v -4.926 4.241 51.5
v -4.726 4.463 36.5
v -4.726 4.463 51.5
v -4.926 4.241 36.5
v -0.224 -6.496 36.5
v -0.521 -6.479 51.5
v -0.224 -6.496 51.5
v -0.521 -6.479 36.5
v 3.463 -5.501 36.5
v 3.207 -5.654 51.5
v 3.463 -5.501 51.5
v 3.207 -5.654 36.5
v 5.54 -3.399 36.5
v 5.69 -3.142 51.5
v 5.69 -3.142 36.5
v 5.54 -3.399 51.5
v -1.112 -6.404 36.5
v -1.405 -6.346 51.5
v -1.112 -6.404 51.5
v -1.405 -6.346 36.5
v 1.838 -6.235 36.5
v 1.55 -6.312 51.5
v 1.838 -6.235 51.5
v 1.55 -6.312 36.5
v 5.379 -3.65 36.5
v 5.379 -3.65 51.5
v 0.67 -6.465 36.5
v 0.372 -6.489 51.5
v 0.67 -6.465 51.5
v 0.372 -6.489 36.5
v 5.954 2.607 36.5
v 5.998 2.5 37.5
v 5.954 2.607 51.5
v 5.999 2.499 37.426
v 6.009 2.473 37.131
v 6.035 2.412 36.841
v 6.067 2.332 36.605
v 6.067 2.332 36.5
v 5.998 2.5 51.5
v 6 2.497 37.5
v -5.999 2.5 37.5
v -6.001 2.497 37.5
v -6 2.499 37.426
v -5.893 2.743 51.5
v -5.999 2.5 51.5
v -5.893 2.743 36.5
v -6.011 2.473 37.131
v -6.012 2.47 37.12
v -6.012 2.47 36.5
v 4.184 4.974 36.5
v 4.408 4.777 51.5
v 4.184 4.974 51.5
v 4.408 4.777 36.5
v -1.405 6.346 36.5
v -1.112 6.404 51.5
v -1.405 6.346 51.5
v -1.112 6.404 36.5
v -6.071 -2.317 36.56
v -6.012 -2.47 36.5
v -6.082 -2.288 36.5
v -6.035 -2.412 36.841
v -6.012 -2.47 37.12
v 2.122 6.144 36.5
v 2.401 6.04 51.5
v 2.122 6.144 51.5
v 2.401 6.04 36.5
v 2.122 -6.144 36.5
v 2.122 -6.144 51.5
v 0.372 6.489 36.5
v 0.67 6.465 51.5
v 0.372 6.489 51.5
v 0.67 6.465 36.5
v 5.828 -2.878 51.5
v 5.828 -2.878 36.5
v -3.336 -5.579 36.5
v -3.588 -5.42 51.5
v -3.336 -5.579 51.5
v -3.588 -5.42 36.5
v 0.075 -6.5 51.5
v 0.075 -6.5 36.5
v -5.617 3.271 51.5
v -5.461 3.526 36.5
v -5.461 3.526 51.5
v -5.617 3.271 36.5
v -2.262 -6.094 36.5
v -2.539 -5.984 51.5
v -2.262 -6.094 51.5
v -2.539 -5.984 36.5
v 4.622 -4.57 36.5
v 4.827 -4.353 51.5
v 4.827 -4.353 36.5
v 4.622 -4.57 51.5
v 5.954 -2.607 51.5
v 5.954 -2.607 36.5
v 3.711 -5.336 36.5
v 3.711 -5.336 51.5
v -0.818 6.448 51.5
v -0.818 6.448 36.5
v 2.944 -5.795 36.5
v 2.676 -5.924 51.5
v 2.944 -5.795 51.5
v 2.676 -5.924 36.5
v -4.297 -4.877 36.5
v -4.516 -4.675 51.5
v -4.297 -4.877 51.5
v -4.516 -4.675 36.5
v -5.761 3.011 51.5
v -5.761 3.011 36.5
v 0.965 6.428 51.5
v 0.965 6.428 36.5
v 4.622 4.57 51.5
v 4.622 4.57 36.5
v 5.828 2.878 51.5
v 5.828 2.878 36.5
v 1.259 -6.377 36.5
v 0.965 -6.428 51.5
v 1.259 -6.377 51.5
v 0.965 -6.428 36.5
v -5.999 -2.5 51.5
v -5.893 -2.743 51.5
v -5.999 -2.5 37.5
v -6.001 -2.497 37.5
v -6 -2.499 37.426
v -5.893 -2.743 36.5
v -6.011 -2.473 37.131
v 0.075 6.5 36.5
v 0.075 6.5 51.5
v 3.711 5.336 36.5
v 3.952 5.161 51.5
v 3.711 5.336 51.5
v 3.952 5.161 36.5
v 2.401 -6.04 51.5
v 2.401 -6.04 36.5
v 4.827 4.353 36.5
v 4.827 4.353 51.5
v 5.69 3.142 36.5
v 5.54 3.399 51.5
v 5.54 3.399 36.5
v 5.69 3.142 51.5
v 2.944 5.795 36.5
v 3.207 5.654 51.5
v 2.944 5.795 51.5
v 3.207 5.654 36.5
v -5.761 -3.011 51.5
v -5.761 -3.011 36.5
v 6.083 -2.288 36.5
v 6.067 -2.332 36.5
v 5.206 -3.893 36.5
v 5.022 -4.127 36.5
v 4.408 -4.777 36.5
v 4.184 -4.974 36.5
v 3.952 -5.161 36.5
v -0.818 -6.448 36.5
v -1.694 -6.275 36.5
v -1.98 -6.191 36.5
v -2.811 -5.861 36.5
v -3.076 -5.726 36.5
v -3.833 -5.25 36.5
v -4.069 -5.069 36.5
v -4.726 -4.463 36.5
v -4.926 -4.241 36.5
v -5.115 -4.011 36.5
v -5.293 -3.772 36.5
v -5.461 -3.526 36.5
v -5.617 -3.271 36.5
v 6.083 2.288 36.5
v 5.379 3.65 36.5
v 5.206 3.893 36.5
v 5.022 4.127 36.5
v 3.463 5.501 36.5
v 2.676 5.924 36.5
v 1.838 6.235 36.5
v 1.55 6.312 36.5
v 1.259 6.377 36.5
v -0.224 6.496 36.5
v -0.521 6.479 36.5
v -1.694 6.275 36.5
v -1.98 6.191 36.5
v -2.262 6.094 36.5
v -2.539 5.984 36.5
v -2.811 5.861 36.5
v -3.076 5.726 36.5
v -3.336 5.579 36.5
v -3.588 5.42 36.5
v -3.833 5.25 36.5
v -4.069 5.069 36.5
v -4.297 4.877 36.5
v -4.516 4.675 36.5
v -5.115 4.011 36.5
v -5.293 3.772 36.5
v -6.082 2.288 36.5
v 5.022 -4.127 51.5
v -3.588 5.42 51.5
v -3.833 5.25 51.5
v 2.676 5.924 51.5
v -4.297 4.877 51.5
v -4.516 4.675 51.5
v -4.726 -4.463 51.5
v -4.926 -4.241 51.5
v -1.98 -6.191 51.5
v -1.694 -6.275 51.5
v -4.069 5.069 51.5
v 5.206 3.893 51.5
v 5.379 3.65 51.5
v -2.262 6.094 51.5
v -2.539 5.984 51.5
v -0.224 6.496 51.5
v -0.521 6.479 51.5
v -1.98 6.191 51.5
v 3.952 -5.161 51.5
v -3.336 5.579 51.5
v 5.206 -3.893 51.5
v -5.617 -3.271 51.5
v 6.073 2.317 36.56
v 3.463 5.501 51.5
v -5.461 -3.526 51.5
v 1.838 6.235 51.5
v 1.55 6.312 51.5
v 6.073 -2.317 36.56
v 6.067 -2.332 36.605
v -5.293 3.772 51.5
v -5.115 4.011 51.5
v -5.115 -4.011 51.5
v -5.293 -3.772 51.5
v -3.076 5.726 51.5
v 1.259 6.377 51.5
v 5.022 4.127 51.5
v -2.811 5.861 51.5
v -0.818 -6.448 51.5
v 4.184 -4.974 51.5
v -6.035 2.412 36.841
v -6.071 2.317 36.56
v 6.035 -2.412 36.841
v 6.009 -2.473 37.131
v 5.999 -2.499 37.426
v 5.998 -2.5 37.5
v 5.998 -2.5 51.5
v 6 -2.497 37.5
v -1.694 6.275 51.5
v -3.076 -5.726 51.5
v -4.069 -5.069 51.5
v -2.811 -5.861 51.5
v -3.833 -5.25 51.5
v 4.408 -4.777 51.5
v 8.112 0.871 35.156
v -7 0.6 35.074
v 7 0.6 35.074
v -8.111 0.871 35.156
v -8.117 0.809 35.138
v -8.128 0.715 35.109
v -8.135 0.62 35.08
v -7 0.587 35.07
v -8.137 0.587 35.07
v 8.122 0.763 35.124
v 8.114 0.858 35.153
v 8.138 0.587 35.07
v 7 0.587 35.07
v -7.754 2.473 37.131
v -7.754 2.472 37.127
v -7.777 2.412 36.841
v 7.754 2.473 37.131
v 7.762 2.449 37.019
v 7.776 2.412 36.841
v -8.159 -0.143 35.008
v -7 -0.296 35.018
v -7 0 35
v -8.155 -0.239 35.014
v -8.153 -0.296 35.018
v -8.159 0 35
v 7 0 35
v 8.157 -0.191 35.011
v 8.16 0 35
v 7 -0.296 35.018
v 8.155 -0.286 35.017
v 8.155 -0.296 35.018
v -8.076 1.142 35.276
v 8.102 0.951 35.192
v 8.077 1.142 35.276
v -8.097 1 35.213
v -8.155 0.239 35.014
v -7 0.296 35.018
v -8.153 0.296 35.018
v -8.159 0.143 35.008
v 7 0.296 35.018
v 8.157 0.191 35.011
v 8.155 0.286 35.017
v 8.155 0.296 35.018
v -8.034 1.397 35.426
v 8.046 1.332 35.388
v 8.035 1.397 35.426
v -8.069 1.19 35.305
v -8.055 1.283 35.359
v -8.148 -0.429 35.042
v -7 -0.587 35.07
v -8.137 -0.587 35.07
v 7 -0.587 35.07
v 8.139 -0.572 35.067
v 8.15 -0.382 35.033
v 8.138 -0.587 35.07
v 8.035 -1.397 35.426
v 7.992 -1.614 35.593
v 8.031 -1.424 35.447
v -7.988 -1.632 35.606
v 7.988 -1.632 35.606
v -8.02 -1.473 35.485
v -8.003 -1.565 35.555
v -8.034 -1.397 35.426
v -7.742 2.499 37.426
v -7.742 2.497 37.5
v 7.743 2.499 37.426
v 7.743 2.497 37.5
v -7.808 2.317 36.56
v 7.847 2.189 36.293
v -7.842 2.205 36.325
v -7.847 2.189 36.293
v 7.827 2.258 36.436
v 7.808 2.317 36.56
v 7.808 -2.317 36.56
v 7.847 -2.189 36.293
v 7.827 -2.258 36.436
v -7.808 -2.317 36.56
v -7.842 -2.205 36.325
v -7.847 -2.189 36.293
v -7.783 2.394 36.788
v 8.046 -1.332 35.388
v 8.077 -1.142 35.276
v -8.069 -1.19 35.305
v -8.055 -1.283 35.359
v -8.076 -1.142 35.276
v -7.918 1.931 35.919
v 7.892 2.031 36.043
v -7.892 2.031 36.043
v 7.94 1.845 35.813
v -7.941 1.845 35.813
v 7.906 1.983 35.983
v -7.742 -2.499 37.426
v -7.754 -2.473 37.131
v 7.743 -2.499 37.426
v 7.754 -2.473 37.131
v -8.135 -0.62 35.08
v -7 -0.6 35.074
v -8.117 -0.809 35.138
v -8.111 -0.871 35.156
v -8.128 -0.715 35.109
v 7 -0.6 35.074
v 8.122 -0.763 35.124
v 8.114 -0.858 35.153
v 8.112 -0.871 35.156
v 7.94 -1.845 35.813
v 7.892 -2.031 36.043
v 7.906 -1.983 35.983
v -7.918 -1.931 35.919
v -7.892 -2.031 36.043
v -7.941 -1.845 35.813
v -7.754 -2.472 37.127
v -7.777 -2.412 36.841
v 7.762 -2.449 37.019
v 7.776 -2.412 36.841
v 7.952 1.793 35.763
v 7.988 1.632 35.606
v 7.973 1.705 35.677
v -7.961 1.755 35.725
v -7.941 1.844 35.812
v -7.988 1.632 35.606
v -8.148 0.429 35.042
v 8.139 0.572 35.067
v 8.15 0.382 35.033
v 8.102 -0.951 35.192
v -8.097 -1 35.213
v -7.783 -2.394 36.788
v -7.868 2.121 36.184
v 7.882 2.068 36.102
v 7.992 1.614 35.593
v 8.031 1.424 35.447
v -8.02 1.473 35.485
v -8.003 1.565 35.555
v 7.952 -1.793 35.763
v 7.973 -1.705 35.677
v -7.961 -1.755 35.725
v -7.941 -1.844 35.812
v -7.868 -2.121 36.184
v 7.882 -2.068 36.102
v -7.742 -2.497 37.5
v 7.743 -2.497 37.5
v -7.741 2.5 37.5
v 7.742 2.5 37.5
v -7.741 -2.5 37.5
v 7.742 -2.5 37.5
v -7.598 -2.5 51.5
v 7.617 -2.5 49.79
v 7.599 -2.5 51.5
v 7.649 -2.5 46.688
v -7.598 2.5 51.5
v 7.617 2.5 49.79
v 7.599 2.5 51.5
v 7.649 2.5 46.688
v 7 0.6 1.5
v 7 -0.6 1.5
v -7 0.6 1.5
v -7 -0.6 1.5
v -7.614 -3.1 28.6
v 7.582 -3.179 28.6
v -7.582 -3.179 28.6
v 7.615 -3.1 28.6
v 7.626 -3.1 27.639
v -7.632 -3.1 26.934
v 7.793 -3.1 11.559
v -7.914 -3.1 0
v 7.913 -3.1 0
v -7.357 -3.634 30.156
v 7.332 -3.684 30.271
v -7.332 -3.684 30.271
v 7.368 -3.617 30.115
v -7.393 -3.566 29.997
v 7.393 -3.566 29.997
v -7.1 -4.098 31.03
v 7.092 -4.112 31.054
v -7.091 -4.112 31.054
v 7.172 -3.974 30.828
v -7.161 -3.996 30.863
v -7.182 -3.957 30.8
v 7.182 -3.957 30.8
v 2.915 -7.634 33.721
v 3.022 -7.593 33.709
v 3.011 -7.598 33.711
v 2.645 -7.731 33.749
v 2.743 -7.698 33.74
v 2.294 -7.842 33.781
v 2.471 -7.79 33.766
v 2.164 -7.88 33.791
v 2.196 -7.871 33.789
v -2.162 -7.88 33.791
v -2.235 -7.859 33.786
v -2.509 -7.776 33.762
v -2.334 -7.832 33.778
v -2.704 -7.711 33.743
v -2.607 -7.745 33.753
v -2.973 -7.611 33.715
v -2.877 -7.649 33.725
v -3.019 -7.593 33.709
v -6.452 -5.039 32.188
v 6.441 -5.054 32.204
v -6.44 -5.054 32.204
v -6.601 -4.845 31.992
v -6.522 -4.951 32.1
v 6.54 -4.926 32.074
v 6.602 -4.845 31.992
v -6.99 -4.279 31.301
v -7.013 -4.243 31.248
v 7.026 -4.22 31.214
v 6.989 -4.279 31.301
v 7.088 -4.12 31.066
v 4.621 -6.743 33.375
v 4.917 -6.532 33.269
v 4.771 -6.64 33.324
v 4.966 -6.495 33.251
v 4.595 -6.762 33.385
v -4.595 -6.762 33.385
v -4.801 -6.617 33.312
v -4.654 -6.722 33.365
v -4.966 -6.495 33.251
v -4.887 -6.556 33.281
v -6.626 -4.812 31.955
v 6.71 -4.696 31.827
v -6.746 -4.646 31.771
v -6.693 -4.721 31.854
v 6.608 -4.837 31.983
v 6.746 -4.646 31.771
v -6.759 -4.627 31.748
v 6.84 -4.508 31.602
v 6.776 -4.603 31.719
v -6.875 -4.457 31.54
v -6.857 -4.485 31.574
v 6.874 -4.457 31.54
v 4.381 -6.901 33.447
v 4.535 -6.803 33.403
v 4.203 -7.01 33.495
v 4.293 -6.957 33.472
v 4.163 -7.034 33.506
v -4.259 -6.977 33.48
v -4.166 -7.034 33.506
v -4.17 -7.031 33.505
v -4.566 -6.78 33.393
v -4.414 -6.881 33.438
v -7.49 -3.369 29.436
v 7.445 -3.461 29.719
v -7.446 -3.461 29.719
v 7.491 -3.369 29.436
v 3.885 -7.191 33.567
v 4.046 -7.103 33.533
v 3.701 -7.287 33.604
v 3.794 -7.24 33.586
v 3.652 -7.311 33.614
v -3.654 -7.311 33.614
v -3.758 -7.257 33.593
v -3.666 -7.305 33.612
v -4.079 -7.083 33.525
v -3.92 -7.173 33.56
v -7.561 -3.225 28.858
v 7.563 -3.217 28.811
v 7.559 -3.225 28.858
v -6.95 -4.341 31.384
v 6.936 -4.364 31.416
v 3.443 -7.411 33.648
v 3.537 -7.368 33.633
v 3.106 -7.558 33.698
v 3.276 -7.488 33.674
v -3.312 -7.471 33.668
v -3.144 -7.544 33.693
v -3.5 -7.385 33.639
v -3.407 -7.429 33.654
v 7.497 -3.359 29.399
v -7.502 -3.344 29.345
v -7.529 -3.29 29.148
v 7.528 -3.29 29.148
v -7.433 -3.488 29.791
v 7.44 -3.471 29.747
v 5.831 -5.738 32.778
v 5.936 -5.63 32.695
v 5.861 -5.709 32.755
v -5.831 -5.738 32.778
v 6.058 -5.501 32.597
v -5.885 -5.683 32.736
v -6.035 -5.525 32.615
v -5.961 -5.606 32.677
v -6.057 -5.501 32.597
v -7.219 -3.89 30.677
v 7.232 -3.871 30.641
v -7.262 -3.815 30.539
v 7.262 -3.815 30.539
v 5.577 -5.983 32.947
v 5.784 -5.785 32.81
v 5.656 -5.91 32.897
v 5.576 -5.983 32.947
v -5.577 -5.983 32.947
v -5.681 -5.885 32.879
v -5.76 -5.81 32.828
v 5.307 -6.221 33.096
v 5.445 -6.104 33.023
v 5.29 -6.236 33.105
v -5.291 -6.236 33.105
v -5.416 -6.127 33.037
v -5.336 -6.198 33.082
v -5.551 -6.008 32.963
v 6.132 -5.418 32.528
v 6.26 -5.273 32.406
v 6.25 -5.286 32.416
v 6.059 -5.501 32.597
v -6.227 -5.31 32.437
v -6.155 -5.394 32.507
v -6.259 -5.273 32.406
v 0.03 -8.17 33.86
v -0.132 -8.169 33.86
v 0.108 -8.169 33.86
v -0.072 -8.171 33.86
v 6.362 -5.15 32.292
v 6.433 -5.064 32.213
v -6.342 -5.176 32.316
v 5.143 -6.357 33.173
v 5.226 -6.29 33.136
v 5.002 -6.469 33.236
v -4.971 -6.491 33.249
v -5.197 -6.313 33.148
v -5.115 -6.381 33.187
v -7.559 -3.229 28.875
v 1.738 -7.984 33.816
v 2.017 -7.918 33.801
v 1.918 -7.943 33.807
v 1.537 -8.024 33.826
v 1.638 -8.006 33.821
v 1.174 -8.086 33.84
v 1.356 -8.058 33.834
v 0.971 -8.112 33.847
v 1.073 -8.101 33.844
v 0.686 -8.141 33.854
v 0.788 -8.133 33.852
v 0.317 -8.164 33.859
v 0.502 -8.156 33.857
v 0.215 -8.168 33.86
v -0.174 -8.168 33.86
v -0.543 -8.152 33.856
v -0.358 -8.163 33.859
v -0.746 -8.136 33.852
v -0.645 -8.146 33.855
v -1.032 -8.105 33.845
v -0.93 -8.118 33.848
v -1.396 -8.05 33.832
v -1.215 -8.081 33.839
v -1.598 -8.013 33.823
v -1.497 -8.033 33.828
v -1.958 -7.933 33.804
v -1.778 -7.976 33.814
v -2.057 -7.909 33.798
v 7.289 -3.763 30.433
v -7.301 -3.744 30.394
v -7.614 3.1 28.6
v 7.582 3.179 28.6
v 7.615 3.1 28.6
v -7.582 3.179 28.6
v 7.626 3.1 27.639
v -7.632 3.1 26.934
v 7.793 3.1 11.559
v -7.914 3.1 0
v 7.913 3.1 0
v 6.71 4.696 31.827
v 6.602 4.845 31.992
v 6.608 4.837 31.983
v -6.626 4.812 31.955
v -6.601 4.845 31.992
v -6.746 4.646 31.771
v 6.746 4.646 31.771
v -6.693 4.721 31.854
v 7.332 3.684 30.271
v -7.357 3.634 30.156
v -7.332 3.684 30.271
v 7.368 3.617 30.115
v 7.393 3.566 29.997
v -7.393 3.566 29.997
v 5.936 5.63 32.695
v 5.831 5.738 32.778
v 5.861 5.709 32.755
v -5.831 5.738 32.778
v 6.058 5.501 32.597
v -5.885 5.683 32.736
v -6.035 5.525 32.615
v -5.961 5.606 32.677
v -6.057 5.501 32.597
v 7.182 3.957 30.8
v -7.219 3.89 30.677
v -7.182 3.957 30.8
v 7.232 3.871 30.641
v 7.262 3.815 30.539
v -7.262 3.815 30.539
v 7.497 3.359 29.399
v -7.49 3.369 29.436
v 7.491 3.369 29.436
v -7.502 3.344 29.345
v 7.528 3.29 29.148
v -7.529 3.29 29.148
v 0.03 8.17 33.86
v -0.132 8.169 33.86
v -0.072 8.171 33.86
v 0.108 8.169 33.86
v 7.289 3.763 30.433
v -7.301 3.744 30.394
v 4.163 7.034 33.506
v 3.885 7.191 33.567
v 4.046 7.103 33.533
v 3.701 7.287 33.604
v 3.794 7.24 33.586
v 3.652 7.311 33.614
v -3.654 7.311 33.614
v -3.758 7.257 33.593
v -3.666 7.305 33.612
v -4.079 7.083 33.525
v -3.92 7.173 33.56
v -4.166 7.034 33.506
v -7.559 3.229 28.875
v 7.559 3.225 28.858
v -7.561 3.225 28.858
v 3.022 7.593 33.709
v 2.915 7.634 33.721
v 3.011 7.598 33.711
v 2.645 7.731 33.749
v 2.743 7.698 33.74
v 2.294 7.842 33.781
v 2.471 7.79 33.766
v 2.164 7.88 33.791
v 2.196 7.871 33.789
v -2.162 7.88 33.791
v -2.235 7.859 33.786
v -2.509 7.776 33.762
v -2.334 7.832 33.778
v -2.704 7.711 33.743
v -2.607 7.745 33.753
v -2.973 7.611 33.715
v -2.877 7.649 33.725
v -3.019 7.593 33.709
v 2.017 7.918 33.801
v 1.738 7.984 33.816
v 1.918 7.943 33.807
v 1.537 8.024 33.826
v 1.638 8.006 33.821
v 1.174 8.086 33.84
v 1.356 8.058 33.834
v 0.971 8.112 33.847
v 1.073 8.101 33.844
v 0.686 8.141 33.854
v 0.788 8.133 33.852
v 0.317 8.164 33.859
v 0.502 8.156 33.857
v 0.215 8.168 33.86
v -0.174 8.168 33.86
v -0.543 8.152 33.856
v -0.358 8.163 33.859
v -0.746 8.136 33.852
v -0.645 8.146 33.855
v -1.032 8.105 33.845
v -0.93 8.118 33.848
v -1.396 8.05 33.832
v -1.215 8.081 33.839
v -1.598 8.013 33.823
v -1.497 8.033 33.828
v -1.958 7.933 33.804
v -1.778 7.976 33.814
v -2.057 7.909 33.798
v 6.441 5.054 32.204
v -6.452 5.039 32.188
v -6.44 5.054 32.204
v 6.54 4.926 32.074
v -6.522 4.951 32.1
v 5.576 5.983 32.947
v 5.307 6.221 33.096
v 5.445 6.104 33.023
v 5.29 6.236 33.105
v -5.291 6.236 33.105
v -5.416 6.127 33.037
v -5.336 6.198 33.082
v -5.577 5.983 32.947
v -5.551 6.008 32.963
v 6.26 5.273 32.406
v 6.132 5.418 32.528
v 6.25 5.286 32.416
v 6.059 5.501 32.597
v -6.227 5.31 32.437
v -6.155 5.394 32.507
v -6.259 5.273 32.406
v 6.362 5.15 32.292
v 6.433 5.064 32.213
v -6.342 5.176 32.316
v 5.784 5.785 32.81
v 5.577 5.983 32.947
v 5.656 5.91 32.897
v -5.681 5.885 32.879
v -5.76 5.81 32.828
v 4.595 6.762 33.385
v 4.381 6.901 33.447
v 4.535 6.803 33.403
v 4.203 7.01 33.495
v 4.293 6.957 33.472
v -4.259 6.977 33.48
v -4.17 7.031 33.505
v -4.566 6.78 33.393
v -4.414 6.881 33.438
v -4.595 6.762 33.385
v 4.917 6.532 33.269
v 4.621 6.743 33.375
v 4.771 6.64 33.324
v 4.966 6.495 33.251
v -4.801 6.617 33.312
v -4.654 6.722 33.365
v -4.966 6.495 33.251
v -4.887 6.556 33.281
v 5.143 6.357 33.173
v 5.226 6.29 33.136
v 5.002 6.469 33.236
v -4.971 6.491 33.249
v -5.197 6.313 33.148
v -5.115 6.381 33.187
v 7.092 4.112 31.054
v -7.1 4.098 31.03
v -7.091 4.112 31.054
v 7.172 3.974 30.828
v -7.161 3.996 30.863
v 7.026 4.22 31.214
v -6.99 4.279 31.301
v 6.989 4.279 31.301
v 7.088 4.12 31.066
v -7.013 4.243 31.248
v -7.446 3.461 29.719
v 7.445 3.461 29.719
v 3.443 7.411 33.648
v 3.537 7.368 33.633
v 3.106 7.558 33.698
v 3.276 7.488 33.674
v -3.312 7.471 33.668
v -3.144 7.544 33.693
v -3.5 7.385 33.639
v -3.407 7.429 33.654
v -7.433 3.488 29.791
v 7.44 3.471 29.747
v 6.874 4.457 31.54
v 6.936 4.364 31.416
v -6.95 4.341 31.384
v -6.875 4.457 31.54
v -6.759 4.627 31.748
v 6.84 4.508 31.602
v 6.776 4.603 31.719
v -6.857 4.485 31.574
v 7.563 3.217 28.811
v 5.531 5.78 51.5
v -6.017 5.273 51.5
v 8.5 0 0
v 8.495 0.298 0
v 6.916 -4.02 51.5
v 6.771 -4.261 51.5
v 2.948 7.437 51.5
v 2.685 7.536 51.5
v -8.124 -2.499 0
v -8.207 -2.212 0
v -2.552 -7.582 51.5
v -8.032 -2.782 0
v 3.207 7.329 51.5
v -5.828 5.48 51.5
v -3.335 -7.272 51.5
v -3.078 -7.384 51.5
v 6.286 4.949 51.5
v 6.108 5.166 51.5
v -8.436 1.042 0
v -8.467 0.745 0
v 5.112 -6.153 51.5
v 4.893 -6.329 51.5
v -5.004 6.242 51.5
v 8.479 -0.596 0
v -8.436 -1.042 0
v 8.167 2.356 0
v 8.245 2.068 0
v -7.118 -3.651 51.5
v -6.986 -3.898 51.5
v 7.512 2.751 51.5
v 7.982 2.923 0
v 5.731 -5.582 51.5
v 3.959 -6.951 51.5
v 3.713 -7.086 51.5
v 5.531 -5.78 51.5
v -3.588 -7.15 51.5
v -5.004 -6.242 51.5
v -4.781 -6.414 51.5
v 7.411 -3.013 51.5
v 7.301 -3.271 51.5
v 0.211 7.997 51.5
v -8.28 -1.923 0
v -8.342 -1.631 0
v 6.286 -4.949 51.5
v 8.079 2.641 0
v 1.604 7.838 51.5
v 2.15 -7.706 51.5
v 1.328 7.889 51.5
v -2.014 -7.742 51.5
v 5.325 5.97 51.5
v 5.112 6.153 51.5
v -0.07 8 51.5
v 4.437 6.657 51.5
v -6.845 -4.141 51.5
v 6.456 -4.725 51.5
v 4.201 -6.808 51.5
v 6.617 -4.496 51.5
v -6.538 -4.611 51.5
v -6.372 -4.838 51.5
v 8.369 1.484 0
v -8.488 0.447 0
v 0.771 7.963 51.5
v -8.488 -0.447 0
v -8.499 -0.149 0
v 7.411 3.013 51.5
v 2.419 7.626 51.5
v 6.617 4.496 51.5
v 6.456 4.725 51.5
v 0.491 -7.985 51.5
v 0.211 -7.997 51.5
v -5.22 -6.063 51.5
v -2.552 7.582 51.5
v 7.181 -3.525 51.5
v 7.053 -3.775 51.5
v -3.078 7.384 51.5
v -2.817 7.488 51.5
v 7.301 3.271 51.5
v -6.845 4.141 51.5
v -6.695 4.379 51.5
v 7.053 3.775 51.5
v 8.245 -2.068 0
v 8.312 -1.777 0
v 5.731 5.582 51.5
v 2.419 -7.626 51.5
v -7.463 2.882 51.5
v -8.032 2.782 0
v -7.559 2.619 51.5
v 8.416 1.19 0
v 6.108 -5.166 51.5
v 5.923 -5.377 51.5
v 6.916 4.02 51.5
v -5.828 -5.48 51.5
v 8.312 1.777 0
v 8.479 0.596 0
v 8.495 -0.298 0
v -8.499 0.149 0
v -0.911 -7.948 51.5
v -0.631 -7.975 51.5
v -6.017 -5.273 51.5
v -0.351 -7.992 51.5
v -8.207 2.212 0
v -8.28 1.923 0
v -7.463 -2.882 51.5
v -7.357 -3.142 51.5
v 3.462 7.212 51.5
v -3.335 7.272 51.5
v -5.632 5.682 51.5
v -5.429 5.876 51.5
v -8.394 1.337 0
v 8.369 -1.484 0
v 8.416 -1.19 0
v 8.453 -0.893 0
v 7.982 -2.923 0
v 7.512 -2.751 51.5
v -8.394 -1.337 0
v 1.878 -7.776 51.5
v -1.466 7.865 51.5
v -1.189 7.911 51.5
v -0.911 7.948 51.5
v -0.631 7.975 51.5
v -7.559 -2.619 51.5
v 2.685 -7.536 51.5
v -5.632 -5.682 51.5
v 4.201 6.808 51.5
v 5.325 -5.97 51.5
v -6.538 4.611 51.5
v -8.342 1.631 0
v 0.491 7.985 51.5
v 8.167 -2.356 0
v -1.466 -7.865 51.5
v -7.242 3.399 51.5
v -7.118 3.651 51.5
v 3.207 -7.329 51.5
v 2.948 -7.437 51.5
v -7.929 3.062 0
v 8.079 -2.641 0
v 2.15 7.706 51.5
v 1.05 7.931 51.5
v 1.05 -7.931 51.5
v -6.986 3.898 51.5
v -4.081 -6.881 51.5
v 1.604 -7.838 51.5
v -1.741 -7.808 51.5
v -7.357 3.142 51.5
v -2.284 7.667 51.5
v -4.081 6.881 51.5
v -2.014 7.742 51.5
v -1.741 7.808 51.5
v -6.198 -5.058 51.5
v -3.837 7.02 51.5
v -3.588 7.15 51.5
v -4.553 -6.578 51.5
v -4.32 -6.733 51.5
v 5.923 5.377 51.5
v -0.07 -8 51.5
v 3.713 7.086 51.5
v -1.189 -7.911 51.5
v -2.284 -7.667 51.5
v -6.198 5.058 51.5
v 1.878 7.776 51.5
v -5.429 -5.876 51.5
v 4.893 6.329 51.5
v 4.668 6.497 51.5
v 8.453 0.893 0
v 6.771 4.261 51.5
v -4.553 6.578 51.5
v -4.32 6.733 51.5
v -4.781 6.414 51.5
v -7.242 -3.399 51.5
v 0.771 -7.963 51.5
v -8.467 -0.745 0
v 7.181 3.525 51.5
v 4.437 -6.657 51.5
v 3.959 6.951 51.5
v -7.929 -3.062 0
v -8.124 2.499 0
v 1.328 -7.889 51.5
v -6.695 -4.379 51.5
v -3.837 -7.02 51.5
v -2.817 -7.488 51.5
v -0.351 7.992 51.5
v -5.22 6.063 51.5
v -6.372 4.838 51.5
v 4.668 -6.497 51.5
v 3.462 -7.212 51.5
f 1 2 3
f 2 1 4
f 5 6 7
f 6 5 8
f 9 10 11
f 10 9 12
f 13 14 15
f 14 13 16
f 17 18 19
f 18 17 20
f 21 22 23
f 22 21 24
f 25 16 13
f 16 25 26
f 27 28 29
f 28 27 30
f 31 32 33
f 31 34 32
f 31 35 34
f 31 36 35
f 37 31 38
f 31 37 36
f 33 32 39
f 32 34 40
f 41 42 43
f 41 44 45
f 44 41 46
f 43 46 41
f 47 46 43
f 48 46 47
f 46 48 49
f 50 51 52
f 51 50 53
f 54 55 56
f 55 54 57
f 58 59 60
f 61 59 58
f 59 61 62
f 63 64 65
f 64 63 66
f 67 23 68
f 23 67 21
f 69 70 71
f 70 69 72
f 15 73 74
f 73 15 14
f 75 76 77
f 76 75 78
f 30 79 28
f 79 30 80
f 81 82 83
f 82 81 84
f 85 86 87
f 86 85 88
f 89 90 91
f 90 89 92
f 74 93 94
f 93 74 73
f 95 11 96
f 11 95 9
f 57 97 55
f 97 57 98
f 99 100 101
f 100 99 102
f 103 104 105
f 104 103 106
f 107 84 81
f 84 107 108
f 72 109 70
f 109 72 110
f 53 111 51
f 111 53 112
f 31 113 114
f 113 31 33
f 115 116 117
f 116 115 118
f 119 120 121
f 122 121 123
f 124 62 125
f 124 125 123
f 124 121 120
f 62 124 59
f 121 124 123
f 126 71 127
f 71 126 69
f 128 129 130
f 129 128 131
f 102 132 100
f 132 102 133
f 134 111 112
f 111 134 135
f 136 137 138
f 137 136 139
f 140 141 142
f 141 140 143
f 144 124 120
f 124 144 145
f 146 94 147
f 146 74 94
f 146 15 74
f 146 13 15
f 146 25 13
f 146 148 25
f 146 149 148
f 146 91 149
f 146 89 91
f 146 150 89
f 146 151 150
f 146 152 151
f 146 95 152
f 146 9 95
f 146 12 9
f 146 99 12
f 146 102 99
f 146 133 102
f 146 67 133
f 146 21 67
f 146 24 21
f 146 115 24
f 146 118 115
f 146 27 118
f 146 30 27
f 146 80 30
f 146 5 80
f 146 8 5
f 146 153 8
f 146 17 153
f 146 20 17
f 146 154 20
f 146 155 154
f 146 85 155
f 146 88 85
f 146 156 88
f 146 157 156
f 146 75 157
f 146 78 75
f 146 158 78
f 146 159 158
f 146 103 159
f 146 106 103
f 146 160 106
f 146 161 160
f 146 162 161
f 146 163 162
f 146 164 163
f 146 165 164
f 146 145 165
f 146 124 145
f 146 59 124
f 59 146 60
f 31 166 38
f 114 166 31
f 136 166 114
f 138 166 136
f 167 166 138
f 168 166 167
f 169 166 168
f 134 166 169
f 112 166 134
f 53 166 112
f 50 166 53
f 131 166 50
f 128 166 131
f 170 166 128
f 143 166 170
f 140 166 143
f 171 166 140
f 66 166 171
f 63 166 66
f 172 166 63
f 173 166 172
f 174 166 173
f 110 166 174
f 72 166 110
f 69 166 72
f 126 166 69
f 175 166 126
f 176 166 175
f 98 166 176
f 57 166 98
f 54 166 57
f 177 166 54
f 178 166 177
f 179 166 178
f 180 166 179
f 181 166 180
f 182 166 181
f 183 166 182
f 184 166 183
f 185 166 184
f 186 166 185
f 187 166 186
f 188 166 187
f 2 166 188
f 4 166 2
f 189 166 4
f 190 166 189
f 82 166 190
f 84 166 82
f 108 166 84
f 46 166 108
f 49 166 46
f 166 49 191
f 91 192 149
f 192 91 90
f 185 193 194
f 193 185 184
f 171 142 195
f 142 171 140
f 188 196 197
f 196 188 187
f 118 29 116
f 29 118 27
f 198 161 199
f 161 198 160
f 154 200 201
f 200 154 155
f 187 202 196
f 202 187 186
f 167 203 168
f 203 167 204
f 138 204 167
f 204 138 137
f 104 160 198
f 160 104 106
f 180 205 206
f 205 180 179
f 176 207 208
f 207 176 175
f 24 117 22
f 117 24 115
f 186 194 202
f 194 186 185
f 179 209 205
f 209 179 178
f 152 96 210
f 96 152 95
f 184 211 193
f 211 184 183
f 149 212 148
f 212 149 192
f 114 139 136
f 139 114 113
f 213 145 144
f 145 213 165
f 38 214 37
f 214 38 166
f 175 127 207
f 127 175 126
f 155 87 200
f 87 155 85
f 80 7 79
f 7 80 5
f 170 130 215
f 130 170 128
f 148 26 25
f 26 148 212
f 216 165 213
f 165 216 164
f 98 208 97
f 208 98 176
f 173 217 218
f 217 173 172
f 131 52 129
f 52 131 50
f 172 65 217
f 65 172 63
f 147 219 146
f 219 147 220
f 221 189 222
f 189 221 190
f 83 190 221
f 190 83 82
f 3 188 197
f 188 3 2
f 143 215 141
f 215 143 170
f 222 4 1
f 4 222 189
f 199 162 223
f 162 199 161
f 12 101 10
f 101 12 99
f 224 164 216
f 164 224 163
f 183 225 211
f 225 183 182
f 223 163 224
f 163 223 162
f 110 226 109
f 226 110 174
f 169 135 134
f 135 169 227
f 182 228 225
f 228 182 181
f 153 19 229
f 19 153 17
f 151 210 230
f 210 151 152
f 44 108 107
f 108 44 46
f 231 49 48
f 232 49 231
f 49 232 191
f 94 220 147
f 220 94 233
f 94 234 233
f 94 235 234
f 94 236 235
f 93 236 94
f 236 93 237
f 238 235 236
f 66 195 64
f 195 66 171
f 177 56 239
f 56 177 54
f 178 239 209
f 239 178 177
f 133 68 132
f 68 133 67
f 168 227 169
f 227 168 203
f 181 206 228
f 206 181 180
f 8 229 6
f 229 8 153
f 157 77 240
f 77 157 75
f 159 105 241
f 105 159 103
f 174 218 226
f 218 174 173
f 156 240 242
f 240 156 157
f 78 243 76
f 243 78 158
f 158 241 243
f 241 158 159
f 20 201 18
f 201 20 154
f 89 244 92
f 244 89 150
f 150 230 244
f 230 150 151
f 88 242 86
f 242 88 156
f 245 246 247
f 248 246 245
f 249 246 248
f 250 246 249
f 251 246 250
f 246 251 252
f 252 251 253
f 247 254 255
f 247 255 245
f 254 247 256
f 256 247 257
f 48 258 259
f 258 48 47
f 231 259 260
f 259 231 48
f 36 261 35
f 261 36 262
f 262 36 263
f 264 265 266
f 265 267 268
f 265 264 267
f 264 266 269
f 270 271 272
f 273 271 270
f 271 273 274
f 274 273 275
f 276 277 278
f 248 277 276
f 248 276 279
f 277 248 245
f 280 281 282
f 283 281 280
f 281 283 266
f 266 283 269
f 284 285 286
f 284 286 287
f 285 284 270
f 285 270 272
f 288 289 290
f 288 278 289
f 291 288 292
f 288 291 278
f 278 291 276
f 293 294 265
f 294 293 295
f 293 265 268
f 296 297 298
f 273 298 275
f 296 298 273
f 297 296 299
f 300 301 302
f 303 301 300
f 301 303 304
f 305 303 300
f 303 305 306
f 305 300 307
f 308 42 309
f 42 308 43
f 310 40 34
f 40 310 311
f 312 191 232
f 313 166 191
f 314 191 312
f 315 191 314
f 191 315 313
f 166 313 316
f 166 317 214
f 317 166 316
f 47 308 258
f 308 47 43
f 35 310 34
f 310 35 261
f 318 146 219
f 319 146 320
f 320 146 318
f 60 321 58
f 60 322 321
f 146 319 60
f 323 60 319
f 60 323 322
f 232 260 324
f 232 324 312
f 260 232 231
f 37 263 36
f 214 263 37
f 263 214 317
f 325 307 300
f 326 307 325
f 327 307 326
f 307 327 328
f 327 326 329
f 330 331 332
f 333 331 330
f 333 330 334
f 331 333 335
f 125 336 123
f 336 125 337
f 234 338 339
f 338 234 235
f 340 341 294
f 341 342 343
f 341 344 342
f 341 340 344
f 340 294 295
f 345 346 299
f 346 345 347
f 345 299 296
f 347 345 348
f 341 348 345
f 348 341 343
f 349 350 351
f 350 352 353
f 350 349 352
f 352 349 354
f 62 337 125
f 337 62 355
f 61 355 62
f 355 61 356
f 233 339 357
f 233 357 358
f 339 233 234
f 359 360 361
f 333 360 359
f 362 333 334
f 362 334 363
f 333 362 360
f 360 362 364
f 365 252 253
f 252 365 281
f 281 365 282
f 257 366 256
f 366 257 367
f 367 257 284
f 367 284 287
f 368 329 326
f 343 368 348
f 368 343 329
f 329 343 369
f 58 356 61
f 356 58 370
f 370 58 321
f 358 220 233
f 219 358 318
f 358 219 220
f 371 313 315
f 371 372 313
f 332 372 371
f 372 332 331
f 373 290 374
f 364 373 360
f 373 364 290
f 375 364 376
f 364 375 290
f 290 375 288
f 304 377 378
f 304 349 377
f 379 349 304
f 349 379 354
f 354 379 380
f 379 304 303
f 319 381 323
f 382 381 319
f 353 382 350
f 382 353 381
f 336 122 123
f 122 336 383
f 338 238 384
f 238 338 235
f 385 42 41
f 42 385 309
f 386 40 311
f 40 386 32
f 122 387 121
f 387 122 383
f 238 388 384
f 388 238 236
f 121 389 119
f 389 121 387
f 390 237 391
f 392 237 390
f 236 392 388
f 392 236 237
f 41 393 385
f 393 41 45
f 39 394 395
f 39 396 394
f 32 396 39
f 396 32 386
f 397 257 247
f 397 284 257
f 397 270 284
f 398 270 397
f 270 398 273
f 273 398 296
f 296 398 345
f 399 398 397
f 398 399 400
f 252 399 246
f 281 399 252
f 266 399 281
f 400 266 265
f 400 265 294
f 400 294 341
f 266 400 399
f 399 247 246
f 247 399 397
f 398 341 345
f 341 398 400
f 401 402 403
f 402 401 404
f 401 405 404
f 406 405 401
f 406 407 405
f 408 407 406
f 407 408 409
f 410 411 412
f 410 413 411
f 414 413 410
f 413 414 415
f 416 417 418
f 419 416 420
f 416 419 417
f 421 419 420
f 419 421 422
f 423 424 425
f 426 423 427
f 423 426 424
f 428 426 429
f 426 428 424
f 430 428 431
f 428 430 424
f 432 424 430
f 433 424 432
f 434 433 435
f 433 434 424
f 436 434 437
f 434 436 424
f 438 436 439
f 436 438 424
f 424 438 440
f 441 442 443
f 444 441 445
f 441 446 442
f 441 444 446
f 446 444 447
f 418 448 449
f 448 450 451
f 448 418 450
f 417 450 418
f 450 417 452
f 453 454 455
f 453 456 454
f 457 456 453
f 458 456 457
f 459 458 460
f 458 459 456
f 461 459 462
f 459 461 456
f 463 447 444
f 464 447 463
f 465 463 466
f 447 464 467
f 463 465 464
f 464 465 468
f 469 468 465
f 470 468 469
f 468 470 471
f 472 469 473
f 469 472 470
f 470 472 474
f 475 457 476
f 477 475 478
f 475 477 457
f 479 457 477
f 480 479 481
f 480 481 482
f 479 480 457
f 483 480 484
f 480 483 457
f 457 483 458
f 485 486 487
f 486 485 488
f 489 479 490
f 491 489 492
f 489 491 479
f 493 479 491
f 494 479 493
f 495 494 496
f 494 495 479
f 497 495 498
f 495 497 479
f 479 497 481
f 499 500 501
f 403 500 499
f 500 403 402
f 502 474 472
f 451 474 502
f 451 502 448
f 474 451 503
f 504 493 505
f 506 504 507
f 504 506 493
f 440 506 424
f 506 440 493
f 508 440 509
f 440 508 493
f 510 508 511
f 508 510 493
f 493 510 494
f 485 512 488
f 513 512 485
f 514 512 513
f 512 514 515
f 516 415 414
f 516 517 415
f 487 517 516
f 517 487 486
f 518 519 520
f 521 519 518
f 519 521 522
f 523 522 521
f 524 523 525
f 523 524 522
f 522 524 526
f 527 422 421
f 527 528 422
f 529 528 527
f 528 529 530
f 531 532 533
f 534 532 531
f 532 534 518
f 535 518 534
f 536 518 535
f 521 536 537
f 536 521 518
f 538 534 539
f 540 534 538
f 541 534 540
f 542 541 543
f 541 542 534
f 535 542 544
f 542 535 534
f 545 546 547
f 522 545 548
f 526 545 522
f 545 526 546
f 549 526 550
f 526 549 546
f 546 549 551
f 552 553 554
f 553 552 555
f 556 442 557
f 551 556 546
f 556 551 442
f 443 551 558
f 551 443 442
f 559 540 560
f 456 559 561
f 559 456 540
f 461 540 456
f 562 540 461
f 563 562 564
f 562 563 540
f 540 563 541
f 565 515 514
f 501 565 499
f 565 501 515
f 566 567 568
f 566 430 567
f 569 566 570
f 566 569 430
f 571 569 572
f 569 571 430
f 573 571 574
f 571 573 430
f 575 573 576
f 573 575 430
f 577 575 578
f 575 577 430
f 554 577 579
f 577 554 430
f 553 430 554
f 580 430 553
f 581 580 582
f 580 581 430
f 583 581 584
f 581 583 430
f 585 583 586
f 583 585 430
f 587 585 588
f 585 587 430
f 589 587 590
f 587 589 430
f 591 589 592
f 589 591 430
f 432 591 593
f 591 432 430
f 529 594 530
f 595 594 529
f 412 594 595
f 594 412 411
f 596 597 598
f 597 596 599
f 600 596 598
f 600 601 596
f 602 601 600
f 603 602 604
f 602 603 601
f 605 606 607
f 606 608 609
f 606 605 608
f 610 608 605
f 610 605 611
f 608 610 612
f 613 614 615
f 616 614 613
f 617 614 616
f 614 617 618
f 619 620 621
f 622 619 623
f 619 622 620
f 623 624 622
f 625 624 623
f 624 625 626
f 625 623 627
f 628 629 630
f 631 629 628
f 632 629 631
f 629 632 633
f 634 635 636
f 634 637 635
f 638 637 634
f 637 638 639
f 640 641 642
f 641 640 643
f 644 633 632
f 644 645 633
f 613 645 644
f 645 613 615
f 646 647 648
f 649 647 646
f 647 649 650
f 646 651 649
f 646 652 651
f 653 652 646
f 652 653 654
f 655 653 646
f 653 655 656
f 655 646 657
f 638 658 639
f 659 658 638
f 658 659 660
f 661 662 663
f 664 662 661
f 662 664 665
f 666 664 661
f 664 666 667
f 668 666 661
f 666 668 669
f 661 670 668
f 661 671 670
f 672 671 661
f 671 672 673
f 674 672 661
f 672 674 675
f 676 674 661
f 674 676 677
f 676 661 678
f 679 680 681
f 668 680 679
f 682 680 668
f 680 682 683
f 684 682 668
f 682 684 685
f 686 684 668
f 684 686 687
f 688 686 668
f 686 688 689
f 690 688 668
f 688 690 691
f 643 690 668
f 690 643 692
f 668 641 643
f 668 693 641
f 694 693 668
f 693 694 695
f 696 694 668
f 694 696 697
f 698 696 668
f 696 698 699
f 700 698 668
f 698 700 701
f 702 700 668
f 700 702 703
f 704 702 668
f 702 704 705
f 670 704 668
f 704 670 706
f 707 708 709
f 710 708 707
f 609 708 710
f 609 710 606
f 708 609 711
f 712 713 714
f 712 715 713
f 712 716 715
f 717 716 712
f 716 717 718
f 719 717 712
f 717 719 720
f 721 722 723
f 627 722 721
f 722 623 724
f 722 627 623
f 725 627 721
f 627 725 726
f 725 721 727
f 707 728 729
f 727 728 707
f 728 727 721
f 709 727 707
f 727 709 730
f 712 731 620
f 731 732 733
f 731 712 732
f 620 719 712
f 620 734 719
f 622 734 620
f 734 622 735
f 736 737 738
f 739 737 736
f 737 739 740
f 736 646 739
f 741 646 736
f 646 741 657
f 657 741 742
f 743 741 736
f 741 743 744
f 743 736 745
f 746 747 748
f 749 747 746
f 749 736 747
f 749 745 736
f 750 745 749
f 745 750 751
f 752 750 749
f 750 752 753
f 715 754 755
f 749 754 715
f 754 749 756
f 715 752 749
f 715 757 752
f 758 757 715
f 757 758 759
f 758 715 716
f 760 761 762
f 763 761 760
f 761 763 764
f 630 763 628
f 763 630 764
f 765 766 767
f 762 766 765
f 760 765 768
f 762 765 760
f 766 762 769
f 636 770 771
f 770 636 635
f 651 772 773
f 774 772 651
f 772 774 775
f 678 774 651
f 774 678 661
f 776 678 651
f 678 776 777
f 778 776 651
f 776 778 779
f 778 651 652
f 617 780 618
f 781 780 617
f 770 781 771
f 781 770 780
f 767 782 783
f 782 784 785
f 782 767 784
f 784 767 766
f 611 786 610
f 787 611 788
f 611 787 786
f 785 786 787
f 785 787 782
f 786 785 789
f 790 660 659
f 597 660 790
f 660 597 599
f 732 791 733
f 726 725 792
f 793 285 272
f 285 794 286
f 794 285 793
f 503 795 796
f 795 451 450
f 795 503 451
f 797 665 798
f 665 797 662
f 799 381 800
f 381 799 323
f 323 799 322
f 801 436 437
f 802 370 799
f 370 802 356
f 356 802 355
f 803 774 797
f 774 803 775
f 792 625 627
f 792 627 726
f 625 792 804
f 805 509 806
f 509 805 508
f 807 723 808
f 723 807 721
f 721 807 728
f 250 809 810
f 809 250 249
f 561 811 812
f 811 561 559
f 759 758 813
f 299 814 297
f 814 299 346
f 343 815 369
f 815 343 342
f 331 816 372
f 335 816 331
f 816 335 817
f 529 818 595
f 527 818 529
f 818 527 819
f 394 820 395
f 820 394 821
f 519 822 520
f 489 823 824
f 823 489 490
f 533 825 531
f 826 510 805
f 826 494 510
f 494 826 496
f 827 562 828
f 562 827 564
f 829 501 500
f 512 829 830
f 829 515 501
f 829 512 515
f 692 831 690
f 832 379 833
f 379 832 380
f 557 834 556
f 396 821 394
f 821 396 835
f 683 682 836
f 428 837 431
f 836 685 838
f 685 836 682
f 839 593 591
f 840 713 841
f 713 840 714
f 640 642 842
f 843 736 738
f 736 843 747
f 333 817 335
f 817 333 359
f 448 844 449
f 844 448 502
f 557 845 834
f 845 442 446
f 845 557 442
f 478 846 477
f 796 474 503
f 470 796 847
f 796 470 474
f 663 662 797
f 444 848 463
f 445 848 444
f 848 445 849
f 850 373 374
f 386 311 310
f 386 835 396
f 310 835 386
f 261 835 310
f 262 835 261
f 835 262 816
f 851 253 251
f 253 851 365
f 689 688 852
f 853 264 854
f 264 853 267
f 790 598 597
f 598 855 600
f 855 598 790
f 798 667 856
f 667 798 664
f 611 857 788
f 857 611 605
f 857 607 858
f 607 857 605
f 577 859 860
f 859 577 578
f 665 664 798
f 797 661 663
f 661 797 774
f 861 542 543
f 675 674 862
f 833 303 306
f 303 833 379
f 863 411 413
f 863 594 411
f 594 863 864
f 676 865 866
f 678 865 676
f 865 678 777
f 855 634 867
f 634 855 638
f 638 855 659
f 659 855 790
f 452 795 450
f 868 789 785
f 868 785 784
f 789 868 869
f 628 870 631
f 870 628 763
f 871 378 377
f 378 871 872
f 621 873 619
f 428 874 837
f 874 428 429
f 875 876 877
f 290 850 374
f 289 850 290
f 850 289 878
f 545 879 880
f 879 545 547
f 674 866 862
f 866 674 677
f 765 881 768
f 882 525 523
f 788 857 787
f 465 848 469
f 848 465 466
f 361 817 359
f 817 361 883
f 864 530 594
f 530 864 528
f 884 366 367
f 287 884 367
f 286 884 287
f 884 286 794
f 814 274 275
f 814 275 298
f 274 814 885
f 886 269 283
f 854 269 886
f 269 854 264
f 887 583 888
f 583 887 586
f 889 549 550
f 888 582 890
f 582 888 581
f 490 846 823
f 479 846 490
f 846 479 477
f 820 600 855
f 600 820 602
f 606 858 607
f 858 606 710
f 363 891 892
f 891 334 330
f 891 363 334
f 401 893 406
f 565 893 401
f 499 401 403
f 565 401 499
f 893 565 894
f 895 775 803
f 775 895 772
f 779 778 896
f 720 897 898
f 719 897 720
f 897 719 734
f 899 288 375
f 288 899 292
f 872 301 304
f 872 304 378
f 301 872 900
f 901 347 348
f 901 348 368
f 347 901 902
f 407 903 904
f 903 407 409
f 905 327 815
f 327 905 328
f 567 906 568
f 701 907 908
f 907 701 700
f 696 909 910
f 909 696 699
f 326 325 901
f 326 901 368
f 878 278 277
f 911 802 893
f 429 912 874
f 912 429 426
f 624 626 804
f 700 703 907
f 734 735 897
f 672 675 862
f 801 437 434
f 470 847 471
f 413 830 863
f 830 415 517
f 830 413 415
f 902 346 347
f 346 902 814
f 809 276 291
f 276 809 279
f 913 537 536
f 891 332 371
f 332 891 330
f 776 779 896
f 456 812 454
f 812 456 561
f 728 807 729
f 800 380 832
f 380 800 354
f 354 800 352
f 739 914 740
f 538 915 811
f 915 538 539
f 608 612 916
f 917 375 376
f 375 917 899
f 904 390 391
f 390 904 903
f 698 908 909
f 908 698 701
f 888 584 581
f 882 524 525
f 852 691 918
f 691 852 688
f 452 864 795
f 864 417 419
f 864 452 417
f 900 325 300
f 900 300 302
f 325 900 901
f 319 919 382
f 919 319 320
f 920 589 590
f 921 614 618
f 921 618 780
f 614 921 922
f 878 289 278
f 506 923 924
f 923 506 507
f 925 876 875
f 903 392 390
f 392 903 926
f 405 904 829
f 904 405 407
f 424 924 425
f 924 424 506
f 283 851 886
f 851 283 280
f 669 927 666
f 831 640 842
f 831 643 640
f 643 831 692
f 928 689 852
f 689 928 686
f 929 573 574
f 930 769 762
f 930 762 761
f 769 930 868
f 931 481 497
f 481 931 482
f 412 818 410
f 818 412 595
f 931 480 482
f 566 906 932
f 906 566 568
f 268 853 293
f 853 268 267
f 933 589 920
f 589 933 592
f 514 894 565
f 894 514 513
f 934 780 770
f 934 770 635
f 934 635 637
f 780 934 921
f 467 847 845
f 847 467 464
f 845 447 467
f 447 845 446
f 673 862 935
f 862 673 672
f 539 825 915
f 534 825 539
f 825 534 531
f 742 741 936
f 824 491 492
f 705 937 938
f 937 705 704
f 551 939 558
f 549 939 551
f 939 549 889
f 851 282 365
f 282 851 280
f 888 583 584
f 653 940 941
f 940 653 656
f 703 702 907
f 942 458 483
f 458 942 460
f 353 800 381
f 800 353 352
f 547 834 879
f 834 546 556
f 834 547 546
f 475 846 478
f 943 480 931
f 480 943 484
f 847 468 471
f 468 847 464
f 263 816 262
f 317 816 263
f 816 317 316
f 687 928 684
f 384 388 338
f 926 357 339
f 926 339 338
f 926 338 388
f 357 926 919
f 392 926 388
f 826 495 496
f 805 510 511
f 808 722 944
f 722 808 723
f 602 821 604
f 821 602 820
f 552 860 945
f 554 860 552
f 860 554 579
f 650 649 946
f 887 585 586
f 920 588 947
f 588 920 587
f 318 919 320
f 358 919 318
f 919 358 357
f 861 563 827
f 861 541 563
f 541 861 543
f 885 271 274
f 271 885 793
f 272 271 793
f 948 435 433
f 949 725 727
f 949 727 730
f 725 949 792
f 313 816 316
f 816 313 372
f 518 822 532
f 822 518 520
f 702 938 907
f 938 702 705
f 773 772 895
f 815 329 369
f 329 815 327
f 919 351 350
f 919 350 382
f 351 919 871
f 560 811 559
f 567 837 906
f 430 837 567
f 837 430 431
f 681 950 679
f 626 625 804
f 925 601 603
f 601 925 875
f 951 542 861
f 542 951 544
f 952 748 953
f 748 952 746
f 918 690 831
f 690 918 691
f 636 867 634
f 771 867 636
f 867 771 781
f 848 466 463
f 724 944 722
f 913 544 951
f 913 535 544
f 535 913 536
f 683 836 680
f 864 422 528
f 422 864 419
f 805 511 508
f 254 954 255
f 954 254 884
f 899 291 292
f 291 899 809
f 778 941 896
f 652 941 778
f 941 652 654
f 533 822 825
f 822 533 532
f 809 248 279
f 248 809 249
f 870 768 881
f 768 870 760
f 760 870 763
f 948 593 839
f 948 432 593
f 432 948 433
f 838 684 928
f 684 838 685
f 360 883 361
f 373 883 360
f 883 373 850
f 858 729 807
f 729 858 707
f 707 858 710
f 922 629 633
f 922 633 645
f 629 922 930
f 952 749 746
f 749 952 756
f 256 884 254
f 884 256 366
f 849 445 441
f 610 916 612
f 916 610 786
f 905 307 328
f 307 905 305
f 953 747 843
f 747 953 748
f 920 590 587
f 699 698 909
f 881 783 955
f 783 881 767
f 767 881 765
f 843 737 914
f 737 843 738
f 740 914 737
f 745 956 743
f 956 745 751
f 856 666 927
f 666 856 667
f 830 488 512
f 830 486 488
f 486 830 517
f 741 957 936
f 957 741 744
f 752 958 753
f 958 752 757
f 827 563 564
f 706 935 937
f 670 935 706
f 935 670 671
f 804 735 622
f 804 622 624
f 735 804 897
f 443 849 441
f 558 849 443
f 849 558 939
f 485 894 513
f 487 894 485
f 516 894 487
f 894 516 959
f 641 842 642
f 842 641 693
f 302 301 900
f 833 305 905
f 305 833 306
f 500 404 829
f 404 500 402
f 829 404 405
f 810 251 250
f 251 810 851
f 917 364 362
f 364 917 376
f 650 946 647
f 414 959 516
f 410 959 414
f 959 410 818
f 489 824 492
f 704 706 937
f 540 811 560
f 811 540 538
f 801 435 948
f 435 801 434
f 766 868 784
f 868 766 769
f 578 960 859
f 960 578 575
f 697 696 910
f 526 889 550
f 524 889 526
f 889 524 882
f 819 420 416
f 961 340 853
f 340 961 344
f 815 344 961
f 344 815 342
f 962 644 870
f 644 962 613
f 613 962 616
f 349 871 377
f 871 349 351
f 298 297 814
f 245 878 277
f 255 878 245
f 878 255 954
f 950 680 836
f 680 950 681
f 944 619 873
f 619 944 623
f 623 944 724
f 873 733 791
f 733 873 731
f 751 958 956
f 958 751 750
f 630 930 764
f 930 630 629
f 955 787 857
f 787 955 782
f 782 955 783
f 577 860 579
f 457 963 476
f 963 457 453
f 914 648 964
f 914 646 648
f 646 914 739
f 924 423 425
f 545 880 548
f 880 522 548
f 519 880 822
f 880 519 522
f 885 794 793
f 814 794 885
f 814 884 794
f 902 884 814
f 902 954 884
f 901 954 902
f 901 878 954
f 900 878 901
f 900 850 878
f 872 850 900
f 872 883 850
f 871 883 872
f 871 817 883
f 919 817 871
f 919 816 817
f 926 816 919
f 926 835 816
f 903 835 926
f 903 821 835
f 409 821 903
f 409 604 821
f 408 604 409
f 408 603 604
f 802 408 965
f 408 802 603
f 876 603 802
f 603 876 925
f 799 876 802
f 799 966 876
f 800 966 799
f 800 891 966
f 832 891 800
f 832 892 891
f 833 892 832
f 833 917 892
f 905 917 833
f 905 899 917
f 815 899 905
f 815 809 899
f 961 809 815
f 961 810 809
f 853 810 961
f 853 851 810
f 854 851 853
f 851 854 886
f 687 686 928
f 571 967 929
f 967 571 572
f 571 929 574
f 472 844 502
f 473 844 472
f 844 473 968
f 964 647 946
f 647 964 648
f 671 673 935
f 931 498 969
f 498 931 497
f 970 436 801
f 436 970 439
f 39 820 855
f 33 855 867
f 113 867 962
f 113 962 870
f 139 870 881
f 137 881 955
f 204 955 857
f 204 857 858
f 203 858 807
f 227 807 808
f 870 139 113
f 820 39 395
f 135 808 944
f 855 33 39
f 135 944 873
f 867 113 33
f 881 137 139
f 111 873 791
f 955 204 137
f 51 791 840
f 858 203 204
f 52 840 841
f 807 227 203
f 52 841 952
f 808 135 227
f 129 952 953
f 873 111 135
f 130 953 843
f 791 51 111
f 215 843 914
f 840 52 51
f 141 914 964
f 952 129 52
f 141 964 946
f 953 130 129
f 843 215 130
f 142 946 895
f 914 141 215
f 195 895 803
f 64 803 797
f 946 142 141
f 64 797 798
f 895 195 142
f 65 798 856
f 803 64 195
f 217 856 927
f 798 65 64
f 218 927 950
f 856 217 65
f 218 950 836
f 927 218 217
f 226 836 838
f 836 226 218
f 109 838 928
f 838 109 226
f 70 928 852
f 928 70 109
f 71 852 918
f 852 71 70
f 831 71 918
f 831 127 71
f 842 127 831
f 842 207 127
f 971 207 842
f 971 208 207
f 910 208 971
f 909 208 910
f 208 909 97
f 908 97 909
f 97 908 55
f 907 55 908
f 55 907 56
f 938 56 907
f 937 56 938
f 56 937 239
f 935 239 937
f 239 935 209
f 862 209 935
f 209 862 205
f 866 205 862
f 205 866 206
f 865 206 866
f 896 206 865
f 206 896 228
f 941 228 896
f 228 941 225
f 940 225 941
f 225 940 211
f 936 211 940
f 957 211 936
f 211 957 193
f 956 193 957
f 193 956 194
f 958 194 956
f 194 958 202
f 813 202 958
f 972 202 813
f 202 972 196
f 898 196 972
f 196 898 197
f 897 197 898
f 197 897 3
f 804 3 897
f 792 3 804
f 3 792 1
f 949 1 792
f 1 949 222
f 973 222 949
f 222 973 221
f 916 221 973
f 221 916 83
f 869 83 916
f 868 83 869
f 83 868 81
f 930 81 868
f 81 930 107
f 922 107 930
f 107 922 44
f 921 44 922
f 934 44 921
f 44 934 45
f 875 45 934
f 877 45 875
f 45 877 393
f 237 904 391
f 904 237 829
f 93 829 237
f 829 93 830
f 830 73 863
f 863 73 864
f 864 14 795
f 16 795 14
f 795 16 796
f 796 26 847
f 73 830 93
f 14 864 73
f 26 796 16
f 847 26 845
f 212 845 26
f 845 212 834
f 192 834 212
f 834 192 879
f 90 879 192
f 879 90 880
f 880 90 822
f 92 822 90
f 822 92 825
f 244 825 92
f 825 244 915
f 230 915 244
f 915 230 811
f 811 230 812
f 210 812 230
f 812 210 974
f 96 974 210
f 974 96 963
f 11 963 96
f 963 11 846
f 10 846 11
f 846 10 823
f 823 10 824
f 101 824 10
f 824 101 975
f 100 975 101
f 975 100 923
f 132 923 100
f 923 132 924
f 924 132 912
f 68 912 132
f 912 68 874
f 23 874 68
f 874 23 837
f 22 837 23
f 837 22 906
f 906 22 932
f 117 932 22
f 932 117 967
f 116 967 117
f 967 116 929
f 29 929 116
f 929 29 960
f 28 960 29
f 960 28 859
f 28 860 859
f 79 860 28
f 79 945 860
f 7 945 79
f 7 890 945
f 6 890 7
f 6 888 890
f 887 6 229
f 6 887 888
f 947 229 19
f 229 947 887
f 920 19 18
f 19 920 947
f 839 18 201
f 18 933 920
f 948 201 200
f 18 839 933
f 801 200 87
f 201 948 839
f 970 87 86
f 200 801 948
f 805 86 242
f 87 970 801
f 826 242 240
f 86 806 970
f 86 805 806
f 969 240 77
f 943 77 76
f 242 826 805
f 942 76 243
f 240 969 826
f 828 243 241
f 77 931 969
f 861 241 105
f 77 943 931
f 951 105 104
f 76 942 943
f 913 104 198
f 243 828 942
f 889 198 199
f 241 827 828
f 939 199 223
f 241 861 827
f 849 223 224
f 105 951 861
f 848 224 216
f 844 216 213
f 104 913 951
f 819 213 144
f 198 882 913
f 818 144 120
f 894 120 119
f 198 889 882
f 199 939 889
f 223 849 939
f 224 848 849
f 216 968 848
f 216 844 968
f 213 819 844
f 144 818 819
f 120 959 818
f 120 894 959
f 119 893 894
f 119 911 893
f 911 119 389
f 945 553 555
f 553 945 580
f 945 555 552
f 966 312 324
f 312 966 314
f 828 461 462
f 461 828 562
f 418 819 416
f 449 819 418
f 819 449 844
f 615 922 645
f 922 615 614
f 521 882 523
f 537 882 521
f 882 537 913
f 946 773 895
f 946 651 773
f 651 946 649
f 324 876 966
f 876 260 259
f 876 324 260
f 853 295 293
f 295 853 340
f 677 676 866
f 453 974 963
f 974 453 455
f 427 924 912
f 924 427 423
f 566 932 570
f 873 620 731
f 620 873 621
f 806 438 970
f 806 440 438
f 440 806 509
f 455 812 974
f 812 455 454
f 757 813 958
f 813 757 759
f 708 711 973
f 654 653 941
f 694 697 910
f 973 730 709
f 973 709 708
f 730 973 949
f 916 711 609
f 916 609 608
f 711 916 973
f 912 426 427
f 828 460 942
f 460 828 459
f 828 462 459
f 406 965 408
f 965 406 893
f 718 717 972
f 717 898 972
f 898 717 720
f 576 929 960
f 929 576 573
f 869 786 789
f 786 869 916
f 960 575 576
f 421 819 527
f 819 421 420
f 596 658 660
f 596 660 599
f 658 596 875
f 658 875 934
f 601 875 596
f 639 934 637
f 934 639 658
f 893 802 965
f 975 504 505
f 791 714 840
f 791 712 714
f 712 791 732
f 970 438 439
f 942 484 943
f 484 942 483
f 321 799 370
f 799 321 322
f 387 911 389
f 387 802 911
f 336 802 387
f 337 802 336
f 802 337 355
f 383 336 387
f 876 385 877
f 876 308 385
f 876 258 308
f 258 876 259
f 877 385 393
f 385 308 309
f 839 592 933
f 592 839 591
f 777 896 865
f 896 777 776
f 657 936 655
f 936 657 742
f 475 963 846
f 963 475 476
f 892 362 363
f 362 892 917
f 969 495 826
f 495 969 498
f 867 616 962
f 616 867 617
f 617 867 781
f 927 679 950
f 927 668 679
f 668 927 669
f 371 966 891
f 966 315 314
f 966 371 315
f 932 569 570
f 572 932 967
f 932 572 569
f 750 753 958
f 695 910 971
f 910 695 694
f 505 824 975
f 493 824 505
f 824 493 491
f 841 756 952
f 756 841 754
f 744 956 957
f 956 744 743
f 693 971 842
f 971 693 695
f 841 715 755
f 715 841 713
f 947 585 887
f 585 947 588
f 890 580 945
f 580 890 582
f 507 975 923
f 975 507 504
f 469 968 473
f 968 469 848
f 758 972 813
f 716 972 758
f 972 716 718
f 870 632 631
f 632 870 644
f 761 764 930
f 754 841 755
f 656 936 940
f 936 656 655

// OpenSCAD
// All values in MM.
// preview[view:south, tilt:top]

// this is the skirt covering the locking knurl
innerDiameter=13;			

// how far over the locking knurl should it extend
innerDepth=15;	

// side wall thickness of the skirt			
wallThickness=1.5; 

// wide enough to accomodate your widest blade		
bladeSlotWidth=14;		

// blade thickness
bladeSlotThickness=1.2;	

// deep enough for the longest blade
bladeSlotDepth=35;	

// 0.1 min , the lower the #, the more segments in circles.
smoothness=0.3; 

// width of the gap in the skirt over the knurl          
gap=5;	

// 1 = trim blade end, 0 = leave round					
trimBlade=1;

				
// ** no changes below this line **

height= innerDepth + bladeSlotDepth + wallThickness;
outterDiameter = innerDiameter + ( 2 * wallThickness );

bottomDiameter = bladeSlotWidth + ( 2 * wallThickness );

if( bottomDiameter <= outterDiameter ){
	//echo("bottom less than outer");
	main(outterDiameter,outterDiameter);
} else if ( bottomDiameter > outterDiameter ){
	//echo("bottom greater than outter");
	main(bottomDiameter,bottomDiameter);
}


module main (slotWidth,bottomDiameter) {
	//echo("bottomDiameter = ", bottomDiameter);
	//echo("outterDiameter = ", outterDiameter);
	//echo("slotWidth = ", slotWidth);

difference() {
	// Generate the main cylindar first
	cylinder(h = height, r1 = bottomDiameter/2, r2 = outterDiameter/2, center = false, $fa = 1, $fs = smoothness);
	union () {

		// Cutout for the locking knurl
		translate([0,0,height - innerDepth])
		cylinder (h = innerDepth+1, r = innerDiameter/2, center = false, $fa = 1, $fs = smoothness);

		// cutout the round at the bottom of the slot
		translate([-((slotWidth/2)+1),0,height - innerDepth+1]) 
			rotate([0,90,0]) 
				cylinder (h = slotWidth + 2, r = gap/2, center = false, $fa = 1, $fs = smoothness);

		// cutout the slot
		translate([-((slotWidth/2)+1),-(gap/2),height+1]) 
			rotate([0,90,0]) 
				cube(size = [innerDepth,gap,slotWidth+2], center = false);

		// cutout the blade slot
		translate([-(bladeSlotWidth/2),-(bladeSlotThickness/2),wallThickness])
		cube(size = [bladeSlotWidth,bladeSlotThickness,bladeSlotDepth], center = false);
	}
		// trim the blade end
		if ( trimBlade == 1 ) {
		trim_blade(((bottomDiameter - bladeSlotThickness -(2*wallThickness))/2)-1,(bladeSlotDepth-(bottomDiameter - bladeSlotThickness -(2*wallThickness))/2),bottomDiameter);
		}
} 
}

module trim_blade(trimDepth,trimHeight,bottomDiameter){
	//echo("trimDepth = ", trimDepth);
	//echo("trimHeight = ", trimHeight);
	//echo("bottomDiameter = ", bottomDiameter);
	//echo("outterDiameter = ", outterDiameter);

	difference(){
		union(){
		translate([-(bottomDiameter/2),-(bottomDiameter/2),-1]) 
			cube(size = [bottomDiameter, trimDepth,trimHeight+1], center = false);
		translate([-(bottomDiameter/2),-(bottomDiameter/2)-1,trimHeight-1])
			rotate([0,90,0]) 	
			cylinder (h = bottomDiameter, r = trimDepth+1, center = false, $fa = 1, $fs = smoothness);
		translate([-(bottomDiameter/2),(bottomDiameter/2)-trimDepth,-1]) 
			cube(size = [bottomDiameter, trimDepth,trimHeight+1], center = false);
		translate([-(bottomDiameter/2),(bottomDiameter/2+1),trimHeight-1])
			rotate([0,90,0]) 	
			cylinder (h = bottomDiameter, r = trimDepth+1, center = false, $fa = 1, $fs = smoothness);
		}
	}
}
